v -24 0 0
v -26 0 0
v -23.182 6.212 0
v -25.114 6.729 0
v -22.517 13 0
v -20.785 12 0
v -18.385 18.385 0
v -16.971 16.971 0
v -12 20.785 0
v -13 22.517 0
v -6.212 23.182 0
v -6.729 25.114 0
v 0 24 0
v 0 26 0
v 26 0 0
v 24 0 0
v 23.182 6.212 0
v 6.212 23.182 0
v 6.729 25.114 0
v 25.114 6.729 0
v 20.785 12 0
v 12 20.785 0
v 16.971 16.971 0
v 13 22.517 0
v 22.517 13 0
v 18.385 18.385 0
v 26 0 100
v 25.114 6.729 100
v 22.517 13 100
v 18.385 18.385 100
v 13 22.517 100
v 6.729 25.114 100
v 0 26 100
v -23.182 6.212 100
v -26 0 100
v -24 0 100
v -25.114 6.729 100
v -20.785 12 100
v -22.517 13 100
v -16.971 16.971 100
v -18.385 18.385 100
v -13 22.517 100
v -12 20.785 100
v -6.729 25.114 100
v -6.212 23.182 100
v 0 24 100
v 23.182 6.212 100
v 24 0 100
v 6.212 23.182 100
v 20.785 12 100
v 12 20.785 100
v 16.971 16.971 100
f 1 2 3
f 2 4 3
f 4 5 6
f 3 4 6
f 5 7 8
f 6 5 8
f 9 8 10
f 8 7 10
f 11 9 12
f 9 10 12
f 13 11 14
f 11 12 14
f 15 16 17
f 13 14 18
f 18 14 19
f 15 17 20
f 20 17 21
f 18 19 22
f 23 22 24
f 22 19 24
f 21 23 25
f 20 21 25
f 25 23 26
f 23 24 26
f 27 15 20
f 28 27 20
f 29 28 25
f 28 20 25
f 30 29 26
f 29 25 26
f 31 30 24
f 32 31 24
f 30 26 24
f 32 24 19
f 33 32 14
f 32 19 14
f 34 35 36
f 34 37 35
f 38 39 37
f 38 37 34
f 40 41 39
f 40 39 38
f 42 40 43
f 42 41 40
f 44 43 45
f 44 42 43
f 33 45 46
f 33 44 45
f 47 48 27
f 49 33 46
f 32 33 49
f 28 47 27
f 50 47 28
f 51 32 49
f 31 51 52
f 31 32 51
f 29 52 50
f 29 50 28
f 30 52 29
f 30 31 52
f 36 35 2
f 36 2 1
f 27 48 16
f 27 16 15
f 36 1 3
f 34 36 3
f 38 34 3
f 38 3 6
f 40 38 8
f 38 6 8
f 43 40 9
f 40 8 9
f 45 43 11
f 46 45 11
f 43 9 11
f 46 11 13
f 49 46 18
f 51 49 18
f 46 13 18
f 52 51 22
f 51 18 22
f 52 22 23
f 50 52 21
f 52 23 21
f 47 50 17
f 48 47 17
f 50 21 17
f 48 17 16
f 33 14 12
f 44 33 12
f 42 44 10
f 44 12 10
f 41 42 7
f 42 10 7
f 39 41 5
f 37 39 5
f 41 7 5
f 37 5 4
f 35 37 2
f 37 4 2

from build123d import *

# Parameters (mm, degrees)
BOSS_EXTRU_1_DEPTH = 100


with BuildPart() as part:
    # Esquisse1 → Boss.-Extru.1 (new body)
    with BuildSketch(Plane.XY):
        with BuildLine():
            Line((-26, 0), (-24, 0))
            ThreePointArc((-24, 0), (0, 24), (24, 0))
            Line((24, 0), (26, 0))
            ThreePointArc((26, 0), (18.384776311, 18.384776311), (0, 26))
            ThreePointArc((0, 26), (-18.384776311, 18.384776311), (-26, 0))
        make_face()
    extrude(amount=BOSS_EXTRU_1_DEPTH)


solid = part.part
